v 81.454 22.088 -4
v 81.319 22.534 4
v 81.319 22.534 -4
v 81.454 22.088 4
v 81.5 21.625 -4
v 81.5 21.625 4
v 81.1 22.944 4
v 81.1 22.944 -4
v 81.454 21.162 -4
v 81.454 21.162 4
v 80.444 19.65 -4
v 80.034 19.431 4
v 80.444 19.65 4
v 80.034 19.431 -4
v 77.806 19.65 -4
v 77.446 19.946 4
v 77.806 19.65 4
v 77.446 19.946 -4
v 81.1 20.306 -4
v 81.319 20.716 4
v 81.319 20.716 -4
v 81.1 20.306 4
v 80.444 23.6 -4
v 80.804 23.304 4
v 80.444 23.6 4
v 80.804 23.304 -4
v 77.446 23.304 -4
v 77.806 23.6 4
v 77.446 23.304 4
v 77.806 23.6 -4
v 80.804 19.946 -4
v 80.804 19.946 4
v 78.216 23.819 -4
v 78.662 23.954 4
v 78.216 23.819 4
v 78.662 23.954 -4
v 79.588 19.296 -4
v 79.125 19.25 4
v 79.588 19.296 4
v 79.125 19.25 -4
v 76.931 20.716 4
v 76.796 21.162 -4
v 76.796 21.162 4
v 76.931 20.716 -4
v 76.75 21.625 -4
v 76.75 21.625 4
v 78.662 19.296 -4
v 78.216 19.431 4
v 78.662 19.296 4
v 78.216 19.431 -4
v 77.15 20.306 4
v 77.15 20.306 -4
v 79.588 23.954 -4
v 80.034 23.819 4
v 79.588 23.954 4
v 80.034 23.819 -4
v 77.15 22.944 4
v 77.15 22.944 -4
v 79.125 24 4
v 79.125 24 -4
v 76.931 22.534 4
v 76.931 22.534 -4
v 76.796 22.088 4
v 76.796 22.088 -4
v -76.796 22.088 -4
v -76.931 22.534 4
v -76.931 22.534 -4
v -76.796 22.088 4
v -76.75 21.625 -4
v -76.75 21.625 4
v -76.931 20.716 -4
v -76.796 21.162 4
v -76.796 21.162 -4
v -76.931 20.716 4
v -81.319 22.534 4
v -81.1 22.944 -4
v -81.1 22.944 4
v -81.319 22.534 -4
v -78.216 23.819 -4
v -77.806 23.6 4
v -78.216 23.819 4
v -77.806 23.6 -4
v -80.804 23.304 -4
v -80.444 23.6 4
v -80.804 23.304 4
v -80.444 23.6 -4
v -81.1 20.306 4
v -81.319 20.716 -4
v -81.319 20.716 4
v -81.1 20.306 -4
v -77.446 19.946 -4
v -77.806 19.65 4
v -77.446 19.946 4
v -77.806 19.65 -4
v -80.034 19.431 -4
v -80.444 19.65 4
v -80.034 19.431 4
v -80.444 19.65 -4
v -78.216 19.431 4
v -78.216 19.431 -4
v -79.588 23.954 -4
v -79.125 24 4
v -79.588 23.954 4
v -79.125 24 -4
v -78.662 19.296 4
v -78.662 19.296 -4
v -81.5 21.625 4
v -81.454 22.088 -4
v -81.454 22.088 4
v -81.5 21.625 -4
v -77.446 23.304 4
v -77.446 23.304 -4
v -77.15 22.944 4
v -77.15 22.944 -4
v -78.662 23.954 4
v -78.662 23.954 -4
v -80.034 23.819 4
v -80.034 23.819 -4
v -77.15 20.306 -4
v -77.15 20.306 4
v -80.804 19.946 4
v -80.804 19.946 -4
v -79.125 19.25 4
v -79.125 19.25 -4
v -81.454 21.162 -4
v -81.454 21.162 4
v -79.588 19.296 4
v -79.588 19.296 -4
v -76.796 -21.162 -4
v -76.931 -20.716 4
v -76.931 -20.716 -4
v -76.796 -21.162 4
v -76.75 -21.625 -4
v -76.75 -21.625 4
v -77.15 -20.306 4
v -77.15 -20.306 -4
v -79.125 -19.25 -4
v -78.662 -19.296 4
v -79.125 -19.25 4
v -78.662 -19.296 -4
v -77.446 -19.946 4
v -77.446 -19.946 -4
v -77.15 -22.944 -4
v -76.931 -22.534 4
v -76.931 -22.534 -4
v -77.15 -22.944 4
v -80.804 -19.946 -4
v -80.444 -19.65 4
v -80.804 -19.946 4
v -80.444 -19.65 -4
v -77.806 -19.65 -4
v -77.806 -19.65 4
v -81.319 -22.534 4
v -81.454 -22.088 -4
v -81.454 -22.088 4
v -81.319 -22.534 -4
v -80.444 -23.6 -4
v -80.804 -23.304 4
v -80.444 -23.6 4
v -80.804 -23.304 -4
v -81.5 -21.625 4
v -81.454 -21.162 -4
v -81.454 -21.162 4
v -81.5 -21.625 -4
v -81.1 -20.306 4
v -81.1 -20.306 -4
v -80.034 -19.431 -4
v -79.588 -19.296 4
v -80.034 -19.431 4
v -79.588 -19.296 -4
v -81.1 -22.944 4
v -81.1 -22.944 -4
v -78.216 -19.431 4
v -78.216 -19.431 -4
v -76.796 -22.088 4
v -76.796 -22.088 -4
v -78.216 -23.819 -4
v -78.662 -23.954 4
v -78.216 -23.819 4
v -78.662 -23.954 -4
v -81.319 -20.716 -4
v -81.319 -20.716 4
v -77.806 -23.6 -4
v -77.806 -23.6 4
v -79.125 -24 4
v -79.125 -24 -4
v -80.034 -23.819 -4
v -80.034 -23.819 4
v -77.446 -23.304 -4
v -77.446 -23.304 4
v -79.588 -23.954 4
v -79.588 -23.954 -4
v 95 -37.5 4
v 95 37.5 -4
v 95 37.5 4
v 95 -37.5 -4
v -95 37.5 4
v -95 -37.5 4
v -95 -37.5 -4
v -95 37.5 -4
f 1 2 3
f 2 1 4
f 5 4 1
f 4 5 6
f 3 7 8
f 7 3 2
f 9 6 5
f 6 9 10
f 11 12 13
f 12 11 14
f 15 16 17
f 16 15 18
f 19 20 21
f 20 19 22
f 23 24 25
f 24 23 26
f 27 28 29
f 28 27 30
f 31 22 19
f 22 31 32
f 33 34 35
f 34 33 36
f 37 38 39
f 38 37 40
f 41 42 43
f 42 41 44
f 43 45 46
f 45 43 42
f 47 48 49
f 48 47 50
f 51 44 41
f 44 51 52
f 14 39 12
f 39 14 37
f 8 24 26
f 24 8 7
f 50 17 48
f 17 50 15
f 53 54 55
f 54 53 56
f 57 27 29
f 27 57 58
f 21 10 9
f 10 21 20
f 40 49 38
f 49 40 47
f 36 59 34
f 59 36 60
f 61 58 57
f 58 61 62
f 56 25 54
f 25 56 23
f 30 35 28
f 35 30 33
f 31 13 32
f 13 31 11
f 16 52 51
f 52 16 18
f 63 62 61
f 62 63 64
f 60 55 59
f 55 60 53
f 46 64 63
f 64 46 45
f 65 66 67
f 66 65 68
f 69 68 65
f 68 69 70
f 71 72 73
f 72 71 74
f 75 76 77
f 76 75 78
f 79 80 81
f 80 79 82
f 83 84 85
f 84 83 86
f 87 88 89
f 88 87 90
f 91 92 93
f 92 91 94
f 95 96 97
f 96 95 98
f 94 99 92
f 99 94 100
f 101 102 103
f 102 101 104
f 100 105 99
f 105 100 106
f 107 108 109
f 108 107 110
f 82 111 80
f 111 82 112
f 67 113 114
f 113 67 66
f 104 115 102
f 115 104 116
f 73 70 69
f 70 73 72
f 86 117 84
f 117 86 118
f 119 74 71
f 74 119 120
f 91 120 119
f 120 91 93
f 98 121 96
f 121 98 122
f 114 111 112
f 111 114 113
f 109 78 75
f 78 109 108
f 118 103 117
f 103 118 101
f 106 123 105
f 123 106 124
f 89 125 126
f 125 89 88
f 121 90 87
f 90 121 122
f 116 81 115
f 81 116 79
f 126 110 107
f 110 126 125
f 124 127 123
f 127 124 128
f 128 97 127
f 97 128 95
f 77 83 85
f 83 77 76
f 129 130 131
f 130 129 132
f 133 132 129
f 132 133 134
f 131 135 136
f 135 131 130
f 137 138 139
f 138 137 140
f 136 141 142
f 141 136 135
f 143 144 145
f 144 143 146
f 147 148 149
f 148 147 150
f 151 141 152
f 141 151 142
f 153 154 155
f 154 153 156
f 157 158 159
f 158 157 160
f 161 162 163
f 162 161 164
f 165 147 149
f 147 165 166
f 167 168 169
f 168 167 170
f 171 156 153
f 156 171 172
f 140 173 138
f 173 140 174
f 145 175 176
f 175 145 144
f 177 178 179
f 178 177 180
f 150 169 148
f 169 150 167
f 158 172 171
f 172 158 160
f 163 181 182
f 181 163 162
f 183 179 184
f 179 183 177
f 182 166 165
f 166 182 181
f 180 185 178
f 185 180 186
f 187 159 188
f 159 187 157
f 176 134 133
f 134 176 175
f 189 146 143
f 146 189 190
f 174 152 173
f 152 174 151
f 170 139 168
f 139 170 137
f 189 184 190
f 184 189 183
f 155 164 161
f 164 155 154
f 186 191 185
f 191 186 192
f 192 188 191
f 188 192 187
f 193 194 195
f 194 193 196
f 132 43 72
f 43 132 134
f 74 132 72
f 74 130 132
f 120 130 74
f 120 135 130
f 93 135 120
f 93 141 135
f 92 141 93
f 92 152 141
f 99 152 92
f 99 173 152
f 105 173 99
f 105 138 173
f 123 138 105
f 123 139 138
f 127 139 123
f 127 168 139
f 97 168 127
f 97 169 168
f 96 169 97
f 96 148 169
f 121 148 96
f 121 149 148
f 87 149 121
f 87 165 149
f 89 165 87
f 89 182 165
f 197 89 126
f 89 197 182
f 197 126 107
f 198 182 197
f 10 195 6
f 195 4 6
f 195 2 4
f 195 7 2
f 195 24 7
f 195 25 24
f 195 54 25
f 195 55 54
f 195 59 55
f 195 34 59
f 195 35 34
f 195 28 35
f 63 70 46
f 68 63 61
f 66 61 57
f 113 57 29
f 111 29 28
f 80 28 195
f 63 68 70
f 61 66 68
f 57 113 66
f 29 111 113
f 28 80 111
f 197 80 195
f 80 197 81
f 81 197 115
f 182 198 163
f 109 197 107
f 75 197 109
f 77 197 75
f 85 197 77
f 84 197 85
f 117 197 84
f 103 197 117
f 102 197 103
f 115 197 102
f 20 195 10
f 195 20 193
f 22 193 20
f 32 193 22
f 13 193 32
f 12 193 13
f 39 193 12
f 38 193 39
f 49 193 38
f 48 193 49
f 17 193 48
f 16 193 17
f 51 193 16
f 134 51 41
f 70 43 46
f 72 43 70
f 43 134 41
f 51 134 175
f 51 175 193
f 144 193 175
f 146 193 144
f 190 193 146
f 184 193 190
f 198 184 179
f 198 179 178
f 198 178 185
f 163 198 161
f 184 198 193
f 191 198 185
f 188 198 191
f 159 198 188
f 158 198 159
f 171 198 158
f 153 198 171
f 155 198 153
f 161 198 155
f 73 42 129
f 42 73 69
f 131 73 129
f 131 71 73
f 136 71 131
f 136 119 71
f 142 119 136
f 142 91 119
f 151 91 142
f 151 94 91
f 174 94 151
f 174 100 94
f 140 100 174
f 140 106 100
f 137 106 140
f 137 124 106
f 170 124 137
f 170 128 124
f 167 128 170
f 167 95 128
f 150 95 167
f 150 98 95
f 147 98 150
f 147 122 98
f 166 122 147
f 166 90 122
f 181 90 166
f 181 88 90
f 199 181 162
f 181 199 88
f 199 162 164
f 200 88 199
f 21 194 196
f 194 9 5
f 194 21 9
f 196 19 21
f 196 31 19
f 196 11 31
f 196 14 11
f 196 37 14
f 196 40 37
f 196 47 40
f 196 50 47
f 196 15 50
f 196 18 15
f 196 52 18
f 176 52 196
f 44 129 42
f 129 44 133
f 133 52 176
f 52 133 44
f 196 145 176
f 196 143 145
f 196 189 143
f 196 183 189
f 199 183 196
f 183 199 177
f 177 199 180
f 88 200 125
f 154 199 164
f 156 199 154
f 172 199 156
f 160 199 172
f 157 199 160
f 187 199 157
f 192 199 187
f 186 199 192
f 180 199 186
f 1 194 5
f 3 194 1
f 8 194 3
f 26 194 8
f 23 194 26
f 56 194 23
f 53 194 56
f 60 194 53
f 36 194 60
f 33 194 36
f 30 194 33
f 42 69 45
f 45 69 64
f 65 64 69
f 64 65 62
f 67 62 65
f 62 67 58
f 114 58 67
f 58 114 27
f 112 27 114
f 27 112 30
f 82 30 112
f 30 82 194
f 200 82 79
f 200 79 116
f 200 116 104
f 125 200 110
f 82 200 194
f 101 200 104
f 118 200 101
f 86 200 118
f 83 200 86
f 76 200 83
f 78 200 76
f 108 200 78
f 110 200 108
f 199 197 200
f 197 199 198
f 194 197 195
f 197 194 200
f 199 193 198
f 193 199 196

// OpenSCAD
$fn = 32;

// ----------------------------------------------------------------------
// Corner plate 190 x 75 x 8
// 3 holes, centres taken from the edge offset
// ----------------------------------------------------------------------

// --- parameters (mm) ---
plate = [190, 75, 8];    // overall size (x, y, z)
holes = 3;               // number of holes the drawing asks for
bore_d = 4.5;            // nominal hole diameter from the drawing
print_allowance = 0.25;  // clearance added for printing
edge = 15.875;           // hole centre offset from the plate edge

// --- derived feature positions (mm) ---
hole_d = bore_d + print_allowance;  // = 4.75   hole diameter as printed
corner_x = plate[0] / 2 - edge;     // = 79.12   corner hole X
corner_y = plate[1] / 2 - edge;     // = 21.62   corner hole Y
feature_centers = [
  [corner_x, corner_y],
  [-corner_x, corner_y],
  [-corner_x, -corner_y]
];   // hole centres the loop below drills

// plate outline, every hole drilled through with the same cutters
difference() {
  cube(plate, center = true);
  for (centre = feature_centers)
    translate([centre[0], centre[1], 0])
      cylinder(d = hole_d, h = plate[2] + 2, center = true);
}
